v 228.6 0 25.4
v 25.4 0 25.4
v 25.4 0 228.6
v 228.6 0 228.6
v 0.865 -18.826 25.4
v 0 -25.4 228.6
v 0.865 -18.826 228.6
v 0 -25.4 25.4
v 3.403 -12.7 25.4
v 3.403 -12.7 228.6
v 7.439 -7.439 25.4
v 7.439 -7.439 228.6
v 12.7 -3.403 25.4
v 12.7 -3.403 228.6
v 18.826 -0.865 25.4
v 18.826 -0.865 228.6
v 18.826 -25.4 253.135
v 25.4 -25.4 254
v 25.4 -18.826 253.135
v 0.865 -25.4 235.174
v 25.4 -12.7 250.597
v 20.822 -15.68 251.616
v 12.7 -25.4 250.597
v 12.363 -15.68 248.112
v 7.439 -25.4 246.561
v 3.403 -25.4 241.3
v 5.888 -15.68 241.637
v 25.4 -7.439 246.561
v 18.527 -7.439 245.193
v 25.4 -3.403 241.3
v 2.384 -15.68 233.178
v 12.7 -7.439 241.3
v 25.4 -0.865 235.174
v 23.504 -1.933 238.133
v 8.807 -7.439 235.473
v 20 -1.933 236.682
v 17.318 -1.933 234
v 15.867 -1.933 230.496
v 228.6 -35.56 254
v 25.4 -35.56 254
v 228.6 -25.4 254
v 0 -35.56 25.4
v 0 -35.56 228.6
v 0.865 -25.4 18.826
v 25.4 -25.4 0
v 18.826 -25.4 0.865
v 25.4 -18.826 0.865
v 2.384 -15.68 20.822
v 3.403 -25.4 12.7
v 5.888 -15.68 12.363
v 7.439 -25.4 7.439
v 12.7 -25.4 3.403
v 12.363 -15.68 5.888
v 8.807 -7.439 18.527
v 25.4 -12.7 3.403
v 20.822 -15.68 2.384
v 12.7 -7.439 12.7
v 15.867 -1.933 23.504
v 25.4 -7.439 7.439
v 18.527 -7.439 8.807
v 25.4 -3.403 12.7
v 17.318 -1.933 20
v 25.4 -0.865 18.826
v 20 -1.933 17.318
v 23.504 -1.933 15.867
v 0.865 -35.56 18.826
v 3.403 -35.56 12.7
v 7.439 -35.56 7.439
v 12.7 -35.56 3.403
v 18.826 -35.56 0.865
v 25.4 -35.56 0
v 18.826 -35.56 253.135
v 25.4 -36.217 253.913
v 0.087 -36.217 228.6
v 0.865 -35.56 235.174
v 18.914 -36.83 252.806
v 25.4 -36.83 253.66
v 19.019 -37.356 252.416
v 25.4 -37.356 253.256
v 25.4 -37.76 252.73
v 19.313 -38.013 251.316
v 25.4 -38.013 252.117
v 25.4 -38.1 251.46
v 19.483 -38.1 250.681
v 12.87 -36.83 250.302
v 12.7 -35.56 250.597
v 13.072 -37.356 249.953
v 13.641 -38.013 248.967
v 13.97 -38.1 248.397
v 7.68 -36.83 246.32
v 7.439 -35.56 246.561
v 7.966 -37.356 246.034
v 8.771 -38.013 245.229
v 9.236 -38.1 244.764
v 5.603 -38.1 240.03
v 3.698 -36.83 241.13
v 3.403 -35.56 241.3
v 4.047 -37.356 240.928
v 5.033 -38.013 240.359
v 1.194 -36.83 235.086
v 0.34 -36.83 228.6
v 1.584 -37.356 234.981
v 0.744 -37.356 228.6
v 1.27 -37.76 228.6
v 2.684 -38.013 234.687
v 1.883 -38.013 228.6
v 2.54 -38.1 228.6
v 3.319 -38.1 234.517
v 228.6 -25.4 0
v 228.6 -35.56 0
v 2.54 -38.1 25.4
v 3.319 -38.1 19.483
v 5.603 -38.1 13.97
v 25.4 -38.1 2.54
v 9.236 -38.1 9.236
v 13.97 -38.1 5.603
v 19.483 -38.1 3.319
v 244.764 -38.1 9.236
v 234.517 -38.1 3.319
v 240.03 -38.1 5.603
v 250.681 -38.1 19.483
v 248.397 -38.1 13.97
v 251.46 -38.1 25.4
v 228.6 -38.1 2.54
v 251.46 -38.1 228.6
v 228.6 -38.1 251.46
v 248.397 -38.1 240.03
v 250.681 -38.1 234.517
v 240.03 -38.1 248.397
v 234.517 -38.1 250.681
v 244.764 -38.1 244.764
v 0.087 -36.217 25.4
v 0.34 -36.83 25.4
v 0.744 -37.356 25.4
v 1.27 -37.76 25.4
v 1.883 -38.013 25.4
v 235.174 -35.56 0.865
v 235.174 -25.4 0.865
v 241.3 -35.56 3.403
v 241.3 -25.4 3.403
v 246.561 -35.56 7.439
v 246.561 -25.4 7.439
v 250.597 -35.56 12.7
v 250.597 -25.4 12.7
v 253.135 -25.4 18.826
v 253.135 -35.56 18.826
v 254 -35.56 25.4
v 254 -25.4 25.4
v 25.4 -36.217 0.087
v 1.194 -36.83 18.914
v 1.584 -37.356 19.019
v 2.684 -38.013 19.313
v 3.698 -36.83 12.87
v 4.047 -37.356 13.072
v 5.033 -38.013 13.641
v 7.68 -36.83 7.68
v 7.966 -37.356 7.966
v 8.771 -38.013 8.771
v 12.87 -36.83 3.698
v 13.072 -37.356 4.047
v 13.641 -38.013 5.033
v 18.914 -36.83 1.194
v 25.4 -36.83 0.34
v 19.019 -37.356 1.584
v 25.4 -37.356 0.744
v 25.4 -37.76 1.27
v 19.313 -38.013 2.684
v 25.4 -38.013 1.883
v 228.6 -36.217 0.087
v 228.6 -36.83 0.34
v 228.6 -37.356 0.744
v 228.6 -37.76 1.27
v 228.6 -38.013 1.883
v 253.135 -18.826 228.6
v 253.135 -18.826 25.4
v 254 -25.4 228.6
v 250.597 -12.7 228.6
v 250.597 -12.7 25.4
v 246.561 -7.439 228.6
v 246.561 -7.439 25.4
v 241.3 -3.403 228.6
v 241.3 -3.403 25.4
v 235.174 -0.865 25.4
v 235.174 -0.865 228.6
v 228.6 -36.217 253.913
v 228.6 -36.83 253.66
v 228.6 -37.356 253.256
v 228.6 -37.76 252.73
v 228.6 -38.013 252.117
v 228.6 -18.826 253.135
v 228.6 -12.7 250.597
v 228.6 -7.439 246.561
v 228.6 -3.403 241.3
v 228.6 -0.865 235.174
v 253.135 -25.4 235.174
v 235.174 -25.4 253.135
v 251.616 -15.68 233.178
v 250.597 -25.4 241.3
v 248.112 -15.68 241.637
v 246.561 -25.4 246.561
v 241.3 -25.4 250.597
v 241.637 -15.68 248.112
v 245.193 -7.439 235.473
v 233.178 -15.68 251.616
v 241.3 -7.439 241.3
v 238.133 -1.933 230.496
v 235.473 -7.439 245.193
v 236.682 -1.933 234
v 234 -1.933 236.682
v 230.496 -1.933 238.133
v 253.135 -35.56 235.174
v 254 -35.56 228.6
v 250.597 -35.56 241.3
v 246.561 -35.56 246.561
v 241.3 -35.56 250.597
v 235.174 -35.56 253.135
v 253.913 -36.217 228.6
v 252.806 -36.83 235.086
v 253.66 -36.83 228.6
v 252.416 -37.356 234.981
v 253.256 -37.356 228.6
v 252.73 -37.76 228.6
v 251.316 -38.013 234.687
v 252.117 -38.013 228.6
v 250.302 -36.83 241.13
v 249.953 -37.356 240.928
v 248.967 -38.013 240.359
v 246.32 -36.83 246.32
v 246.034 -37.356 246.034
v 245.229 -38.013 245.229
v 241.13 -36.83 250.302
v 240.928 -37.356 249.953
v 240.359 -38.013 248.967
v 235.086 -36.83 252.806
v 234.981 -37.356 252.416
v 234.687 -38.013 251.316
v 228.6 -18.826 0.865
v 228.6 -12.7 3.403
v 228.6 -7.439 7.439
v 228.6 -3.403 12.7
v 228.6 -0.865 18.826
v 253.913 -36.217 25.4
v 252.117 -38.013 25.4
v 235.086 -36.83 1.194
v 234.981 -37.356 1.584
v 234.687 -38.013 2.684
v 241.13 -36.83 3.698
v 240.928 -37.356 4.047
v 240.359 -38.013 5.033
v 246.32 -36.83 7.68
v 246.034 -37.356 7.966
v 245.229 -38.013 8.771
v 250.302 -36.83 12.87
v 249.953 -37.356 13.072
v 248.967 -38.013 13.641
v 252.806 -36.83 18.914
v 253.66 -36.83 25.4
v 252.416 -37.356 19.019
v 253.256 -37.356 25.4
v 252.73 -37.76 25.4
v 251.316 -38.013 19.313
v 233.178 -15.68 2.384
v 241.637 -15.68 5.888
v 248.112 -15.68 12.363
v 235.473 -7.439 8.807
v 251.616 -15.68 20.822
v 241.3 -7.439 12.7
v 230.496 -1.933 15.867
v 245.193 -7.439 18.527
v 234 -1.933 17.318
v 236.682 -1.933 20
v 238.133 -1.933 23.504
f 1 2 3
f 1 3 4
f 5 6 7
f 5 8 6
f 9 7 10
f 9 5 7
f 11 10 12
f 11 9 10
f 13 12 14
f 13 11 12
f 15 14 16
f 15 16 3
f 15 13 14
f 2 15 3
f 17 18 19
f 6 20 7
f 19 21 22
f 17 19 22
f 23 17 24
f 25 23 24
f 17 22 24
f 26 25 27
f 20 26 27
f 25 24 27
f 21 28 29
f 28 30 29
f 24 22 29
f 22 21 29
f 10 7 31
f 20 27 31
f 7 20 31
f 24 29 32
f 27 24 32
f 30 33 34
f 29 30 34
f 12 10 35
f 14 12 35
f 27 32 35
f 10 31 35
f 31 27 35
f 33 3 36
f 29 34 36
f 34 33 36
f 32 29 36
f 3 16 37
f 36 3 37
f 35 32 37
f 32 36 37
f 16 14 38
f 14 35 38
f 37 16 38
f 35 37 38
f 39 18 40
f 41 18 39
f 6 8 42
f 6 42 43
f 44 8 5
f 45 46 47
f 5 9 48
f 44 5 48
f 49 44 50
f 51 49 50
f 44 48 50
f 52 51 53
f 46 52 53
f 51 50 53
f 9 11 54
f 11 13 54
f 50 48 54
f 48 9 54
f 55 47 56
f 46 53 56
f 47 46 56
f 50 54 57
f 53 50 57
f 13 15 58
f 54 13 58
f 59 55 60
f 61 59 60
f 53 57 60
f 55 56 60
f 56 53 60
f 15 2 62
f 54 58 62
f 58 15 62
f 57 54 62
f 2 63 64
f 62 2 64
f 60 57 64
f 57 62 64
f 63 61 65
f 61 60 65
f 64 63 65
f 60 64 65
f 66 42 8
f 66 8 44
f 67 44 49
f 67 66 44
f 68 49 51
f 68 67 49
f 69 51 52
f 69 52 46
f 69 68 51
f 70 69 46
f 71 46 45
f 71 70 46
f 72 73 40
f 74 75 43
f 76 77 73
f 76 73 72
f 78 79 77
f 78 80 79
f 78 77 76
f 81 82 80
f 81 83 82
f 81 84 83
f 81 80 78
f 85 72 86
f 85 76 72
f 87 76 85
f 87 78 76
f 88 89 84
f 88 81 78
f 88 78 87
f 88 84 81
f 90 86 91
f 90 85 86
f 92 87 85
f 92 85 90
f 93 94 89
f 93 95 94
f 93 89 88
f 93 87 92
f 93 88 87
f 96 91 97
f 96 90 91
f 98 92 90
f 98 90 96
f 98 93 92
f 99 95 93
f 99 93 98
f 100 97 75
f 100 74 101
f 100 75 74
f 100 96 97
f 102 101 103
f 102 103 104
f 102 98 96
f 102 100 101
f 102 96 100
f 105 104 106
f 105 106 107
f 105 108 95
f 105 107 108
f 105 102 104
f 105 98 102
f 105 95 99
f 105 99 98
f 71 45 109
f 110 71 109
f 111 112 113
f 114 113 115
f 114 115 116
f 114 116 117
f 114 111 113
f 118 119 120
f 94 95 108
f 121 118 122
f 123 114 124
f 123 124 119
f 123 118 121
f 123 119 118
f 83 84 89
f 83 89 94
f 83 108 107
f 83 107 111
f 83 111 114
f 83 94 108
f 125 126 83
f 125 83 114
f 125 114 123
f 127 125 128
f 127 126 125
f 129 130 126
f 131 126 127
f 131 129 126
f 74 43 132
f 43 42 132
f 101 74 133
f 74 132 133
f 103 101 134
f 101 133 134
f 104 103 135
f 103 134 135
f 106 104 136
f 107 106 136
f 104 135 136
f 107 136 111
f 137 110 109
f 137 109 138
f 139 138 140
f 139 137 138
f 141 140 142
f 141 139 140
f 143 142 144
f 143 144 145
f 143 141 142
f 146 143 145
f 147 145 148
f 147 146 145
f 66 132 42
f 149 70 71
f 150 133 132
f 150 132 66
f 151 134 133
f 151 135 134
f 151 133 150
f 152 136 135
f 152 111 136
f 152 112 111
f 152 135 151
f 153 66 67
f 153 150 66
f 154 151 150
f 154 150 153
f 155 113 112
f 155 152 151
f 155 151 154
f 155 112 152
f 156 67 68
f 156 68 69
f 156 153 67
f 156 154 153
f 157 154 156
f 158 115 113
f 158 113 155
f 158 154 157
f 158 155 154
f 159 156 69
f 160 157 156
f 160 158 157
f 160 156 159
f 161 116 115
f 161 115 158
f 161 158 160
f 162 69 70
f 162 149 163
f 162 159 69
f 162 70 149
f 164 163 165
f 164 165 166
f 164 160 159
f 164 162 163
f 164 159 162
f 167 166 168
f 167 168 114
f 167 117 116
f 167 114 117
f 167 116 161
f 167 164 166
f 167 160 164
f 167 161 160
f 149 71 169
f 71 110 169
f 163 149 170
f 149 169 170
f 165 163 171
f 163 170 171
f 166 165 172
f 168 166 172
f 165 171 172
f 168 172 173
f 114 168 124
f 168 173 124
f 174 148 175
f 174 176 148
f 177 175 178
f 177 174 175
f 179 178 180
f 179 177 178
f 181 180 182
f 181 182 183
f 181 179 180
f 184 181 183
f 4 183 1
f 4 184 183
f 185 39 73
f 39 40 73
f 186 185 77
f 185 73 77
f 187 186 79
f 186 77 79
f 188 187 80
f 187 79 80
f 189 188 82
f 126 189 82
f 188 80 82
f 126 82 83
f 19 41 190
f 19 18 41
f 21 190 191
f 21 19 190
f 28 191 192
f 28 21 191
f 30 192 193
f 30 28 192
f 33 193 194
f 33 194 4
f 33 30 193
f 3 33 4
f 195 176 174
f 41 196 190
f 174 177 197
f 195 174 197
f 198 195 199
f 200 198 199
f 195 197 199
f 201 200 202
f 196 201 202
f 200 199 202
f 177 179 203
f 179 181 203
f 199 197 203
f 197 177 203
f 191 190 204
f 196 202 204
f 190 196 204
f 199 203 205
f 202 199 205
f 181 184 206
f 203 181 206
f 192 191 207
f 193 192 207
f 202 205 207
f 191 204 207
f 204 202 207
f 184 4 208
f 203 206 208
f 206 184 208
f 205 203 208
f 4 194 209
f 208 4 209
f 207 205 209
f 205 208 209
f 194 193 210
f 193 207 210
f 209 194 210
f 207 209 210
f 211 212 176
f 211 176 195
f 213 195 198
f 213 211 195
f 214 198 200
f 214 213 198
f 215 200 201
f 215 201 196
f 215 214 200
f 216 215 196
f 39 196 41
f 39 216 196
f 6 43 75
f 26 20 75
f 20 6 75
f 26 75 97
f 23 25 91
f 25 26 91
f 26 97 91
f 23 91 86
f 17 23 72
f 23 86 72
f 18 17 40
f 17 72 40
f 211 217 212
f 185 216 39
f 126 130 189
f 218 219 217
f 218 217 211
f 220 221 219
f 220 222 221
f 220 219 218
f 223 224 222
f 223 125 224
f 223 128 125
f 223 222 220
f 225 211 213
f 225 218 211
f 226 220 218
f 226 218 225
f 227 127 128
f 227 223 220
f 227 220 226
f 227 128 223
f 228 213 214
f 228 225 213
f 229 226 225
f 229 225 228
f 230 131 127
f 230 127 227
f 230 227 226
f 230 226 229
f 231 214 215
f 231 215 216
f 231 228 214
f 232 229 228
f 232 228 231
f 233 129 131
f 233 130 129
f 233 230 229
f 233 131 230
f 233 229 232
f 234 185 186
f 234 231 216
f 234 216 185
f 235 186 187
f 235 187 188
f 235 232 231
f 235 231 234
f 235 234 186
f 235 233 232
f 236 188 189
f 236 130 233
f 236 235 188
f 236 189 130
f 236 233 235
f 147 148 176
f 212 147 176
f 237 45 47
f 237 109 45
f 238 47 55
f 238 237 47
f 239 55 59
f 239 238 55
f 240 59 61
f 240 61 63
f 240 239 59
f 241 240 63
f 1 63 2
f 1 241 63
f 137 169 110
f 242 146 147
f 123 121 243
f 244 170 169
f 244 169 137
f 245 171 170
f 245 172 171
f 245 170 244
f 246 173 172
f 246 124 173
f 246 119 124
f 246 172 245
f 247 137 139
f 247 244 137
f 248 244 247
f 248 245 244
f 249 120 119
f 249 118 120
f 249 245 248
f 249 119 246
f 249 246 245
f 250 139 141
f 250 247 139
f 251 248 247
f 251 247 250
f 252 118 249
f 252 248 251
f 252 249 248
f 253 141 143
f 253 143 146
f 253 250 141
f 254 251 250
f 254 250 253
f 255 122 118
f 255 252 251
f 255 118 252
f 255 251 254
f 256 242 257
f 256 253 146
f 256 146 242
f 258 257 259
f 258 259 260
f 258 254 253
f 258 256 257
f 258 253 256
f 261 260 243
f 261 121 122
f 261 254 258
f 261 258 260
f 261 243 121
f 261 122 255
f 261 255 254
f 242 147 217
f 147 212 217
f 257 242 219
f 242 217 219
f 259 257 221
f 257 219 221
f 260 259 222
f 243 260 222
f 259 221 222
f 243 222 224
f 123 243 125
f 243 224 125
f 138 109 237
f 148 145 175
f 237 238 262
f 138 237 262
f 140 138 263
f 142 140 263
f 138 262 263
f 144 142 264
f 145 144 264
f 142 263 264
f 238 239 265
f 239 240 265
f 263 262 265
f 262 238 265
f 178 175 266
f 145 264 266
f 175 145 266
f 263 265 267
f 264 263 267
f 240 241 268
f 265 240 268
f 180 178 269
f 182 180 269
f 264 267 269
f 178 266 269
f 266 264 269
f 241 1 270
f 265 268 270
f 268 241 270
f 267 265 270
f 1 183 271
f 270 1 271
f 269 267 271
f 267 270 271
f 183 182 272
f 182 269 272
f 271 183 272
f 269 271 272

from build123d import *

# Parameters (mm, degrees)
F0_W     = 254
F0_H     = 254
F1_DEPTH = 38.1
F2_R     = 25.4
F3_R     = 25.4
F4_R     = 25.4
F5_R     = 25.4
F6_R     = 2.54
F7_R     = 25.4


with BuildPart() as f1:
    # F0 (on Front) → F1 (new body)
    with BuildSketch(Plane.XZ):
        with Locations((127, 127)):
            Rectangle(F0_W, F0_H)
    extrude(amount=F1_DEPTH)

    # F2
    f2_edges = [f1.edges().sort_by_distance(p)[0] for p in [
        (0, -19.05, 254),
    ]]
    fillet(f2_edges, radius=F2_R)

    # F3
    f3_edges = [f1.edges().sort_by_distance(p)[0] for p in [
        (0, -19.05, 0),
    ]]
    fillet(f3_edges, radius=F3_R)

    # F4
    f4_edges = [f1.edges().sort_by_distance(p)[0] for p in [
        (254, -19.05, 0),
    ]]
    fillet(f4_edges, radius=F4_R)

    # F5
    f5_edges = [f1.edges().sort_by_distance(p)[0] for p in [
        (254, -19.05, 254),
    ]]
    fillet(f5_edges, radius=F5_R)

    # F6
    f6_edges = [f1.edges().sort_by_distance(p)[0] for p in [
        (254, -38.1, 127),
    ]]
    fillet(f6_edges, radius=F6_R)

    # F7
    f7_edges = [f1.edges().sort_by_distance(p)[0] for p in [
        (254, 0, 127),
    ]]
    fillet(f7_edges, radius=F7_R)


solid = f1.part
